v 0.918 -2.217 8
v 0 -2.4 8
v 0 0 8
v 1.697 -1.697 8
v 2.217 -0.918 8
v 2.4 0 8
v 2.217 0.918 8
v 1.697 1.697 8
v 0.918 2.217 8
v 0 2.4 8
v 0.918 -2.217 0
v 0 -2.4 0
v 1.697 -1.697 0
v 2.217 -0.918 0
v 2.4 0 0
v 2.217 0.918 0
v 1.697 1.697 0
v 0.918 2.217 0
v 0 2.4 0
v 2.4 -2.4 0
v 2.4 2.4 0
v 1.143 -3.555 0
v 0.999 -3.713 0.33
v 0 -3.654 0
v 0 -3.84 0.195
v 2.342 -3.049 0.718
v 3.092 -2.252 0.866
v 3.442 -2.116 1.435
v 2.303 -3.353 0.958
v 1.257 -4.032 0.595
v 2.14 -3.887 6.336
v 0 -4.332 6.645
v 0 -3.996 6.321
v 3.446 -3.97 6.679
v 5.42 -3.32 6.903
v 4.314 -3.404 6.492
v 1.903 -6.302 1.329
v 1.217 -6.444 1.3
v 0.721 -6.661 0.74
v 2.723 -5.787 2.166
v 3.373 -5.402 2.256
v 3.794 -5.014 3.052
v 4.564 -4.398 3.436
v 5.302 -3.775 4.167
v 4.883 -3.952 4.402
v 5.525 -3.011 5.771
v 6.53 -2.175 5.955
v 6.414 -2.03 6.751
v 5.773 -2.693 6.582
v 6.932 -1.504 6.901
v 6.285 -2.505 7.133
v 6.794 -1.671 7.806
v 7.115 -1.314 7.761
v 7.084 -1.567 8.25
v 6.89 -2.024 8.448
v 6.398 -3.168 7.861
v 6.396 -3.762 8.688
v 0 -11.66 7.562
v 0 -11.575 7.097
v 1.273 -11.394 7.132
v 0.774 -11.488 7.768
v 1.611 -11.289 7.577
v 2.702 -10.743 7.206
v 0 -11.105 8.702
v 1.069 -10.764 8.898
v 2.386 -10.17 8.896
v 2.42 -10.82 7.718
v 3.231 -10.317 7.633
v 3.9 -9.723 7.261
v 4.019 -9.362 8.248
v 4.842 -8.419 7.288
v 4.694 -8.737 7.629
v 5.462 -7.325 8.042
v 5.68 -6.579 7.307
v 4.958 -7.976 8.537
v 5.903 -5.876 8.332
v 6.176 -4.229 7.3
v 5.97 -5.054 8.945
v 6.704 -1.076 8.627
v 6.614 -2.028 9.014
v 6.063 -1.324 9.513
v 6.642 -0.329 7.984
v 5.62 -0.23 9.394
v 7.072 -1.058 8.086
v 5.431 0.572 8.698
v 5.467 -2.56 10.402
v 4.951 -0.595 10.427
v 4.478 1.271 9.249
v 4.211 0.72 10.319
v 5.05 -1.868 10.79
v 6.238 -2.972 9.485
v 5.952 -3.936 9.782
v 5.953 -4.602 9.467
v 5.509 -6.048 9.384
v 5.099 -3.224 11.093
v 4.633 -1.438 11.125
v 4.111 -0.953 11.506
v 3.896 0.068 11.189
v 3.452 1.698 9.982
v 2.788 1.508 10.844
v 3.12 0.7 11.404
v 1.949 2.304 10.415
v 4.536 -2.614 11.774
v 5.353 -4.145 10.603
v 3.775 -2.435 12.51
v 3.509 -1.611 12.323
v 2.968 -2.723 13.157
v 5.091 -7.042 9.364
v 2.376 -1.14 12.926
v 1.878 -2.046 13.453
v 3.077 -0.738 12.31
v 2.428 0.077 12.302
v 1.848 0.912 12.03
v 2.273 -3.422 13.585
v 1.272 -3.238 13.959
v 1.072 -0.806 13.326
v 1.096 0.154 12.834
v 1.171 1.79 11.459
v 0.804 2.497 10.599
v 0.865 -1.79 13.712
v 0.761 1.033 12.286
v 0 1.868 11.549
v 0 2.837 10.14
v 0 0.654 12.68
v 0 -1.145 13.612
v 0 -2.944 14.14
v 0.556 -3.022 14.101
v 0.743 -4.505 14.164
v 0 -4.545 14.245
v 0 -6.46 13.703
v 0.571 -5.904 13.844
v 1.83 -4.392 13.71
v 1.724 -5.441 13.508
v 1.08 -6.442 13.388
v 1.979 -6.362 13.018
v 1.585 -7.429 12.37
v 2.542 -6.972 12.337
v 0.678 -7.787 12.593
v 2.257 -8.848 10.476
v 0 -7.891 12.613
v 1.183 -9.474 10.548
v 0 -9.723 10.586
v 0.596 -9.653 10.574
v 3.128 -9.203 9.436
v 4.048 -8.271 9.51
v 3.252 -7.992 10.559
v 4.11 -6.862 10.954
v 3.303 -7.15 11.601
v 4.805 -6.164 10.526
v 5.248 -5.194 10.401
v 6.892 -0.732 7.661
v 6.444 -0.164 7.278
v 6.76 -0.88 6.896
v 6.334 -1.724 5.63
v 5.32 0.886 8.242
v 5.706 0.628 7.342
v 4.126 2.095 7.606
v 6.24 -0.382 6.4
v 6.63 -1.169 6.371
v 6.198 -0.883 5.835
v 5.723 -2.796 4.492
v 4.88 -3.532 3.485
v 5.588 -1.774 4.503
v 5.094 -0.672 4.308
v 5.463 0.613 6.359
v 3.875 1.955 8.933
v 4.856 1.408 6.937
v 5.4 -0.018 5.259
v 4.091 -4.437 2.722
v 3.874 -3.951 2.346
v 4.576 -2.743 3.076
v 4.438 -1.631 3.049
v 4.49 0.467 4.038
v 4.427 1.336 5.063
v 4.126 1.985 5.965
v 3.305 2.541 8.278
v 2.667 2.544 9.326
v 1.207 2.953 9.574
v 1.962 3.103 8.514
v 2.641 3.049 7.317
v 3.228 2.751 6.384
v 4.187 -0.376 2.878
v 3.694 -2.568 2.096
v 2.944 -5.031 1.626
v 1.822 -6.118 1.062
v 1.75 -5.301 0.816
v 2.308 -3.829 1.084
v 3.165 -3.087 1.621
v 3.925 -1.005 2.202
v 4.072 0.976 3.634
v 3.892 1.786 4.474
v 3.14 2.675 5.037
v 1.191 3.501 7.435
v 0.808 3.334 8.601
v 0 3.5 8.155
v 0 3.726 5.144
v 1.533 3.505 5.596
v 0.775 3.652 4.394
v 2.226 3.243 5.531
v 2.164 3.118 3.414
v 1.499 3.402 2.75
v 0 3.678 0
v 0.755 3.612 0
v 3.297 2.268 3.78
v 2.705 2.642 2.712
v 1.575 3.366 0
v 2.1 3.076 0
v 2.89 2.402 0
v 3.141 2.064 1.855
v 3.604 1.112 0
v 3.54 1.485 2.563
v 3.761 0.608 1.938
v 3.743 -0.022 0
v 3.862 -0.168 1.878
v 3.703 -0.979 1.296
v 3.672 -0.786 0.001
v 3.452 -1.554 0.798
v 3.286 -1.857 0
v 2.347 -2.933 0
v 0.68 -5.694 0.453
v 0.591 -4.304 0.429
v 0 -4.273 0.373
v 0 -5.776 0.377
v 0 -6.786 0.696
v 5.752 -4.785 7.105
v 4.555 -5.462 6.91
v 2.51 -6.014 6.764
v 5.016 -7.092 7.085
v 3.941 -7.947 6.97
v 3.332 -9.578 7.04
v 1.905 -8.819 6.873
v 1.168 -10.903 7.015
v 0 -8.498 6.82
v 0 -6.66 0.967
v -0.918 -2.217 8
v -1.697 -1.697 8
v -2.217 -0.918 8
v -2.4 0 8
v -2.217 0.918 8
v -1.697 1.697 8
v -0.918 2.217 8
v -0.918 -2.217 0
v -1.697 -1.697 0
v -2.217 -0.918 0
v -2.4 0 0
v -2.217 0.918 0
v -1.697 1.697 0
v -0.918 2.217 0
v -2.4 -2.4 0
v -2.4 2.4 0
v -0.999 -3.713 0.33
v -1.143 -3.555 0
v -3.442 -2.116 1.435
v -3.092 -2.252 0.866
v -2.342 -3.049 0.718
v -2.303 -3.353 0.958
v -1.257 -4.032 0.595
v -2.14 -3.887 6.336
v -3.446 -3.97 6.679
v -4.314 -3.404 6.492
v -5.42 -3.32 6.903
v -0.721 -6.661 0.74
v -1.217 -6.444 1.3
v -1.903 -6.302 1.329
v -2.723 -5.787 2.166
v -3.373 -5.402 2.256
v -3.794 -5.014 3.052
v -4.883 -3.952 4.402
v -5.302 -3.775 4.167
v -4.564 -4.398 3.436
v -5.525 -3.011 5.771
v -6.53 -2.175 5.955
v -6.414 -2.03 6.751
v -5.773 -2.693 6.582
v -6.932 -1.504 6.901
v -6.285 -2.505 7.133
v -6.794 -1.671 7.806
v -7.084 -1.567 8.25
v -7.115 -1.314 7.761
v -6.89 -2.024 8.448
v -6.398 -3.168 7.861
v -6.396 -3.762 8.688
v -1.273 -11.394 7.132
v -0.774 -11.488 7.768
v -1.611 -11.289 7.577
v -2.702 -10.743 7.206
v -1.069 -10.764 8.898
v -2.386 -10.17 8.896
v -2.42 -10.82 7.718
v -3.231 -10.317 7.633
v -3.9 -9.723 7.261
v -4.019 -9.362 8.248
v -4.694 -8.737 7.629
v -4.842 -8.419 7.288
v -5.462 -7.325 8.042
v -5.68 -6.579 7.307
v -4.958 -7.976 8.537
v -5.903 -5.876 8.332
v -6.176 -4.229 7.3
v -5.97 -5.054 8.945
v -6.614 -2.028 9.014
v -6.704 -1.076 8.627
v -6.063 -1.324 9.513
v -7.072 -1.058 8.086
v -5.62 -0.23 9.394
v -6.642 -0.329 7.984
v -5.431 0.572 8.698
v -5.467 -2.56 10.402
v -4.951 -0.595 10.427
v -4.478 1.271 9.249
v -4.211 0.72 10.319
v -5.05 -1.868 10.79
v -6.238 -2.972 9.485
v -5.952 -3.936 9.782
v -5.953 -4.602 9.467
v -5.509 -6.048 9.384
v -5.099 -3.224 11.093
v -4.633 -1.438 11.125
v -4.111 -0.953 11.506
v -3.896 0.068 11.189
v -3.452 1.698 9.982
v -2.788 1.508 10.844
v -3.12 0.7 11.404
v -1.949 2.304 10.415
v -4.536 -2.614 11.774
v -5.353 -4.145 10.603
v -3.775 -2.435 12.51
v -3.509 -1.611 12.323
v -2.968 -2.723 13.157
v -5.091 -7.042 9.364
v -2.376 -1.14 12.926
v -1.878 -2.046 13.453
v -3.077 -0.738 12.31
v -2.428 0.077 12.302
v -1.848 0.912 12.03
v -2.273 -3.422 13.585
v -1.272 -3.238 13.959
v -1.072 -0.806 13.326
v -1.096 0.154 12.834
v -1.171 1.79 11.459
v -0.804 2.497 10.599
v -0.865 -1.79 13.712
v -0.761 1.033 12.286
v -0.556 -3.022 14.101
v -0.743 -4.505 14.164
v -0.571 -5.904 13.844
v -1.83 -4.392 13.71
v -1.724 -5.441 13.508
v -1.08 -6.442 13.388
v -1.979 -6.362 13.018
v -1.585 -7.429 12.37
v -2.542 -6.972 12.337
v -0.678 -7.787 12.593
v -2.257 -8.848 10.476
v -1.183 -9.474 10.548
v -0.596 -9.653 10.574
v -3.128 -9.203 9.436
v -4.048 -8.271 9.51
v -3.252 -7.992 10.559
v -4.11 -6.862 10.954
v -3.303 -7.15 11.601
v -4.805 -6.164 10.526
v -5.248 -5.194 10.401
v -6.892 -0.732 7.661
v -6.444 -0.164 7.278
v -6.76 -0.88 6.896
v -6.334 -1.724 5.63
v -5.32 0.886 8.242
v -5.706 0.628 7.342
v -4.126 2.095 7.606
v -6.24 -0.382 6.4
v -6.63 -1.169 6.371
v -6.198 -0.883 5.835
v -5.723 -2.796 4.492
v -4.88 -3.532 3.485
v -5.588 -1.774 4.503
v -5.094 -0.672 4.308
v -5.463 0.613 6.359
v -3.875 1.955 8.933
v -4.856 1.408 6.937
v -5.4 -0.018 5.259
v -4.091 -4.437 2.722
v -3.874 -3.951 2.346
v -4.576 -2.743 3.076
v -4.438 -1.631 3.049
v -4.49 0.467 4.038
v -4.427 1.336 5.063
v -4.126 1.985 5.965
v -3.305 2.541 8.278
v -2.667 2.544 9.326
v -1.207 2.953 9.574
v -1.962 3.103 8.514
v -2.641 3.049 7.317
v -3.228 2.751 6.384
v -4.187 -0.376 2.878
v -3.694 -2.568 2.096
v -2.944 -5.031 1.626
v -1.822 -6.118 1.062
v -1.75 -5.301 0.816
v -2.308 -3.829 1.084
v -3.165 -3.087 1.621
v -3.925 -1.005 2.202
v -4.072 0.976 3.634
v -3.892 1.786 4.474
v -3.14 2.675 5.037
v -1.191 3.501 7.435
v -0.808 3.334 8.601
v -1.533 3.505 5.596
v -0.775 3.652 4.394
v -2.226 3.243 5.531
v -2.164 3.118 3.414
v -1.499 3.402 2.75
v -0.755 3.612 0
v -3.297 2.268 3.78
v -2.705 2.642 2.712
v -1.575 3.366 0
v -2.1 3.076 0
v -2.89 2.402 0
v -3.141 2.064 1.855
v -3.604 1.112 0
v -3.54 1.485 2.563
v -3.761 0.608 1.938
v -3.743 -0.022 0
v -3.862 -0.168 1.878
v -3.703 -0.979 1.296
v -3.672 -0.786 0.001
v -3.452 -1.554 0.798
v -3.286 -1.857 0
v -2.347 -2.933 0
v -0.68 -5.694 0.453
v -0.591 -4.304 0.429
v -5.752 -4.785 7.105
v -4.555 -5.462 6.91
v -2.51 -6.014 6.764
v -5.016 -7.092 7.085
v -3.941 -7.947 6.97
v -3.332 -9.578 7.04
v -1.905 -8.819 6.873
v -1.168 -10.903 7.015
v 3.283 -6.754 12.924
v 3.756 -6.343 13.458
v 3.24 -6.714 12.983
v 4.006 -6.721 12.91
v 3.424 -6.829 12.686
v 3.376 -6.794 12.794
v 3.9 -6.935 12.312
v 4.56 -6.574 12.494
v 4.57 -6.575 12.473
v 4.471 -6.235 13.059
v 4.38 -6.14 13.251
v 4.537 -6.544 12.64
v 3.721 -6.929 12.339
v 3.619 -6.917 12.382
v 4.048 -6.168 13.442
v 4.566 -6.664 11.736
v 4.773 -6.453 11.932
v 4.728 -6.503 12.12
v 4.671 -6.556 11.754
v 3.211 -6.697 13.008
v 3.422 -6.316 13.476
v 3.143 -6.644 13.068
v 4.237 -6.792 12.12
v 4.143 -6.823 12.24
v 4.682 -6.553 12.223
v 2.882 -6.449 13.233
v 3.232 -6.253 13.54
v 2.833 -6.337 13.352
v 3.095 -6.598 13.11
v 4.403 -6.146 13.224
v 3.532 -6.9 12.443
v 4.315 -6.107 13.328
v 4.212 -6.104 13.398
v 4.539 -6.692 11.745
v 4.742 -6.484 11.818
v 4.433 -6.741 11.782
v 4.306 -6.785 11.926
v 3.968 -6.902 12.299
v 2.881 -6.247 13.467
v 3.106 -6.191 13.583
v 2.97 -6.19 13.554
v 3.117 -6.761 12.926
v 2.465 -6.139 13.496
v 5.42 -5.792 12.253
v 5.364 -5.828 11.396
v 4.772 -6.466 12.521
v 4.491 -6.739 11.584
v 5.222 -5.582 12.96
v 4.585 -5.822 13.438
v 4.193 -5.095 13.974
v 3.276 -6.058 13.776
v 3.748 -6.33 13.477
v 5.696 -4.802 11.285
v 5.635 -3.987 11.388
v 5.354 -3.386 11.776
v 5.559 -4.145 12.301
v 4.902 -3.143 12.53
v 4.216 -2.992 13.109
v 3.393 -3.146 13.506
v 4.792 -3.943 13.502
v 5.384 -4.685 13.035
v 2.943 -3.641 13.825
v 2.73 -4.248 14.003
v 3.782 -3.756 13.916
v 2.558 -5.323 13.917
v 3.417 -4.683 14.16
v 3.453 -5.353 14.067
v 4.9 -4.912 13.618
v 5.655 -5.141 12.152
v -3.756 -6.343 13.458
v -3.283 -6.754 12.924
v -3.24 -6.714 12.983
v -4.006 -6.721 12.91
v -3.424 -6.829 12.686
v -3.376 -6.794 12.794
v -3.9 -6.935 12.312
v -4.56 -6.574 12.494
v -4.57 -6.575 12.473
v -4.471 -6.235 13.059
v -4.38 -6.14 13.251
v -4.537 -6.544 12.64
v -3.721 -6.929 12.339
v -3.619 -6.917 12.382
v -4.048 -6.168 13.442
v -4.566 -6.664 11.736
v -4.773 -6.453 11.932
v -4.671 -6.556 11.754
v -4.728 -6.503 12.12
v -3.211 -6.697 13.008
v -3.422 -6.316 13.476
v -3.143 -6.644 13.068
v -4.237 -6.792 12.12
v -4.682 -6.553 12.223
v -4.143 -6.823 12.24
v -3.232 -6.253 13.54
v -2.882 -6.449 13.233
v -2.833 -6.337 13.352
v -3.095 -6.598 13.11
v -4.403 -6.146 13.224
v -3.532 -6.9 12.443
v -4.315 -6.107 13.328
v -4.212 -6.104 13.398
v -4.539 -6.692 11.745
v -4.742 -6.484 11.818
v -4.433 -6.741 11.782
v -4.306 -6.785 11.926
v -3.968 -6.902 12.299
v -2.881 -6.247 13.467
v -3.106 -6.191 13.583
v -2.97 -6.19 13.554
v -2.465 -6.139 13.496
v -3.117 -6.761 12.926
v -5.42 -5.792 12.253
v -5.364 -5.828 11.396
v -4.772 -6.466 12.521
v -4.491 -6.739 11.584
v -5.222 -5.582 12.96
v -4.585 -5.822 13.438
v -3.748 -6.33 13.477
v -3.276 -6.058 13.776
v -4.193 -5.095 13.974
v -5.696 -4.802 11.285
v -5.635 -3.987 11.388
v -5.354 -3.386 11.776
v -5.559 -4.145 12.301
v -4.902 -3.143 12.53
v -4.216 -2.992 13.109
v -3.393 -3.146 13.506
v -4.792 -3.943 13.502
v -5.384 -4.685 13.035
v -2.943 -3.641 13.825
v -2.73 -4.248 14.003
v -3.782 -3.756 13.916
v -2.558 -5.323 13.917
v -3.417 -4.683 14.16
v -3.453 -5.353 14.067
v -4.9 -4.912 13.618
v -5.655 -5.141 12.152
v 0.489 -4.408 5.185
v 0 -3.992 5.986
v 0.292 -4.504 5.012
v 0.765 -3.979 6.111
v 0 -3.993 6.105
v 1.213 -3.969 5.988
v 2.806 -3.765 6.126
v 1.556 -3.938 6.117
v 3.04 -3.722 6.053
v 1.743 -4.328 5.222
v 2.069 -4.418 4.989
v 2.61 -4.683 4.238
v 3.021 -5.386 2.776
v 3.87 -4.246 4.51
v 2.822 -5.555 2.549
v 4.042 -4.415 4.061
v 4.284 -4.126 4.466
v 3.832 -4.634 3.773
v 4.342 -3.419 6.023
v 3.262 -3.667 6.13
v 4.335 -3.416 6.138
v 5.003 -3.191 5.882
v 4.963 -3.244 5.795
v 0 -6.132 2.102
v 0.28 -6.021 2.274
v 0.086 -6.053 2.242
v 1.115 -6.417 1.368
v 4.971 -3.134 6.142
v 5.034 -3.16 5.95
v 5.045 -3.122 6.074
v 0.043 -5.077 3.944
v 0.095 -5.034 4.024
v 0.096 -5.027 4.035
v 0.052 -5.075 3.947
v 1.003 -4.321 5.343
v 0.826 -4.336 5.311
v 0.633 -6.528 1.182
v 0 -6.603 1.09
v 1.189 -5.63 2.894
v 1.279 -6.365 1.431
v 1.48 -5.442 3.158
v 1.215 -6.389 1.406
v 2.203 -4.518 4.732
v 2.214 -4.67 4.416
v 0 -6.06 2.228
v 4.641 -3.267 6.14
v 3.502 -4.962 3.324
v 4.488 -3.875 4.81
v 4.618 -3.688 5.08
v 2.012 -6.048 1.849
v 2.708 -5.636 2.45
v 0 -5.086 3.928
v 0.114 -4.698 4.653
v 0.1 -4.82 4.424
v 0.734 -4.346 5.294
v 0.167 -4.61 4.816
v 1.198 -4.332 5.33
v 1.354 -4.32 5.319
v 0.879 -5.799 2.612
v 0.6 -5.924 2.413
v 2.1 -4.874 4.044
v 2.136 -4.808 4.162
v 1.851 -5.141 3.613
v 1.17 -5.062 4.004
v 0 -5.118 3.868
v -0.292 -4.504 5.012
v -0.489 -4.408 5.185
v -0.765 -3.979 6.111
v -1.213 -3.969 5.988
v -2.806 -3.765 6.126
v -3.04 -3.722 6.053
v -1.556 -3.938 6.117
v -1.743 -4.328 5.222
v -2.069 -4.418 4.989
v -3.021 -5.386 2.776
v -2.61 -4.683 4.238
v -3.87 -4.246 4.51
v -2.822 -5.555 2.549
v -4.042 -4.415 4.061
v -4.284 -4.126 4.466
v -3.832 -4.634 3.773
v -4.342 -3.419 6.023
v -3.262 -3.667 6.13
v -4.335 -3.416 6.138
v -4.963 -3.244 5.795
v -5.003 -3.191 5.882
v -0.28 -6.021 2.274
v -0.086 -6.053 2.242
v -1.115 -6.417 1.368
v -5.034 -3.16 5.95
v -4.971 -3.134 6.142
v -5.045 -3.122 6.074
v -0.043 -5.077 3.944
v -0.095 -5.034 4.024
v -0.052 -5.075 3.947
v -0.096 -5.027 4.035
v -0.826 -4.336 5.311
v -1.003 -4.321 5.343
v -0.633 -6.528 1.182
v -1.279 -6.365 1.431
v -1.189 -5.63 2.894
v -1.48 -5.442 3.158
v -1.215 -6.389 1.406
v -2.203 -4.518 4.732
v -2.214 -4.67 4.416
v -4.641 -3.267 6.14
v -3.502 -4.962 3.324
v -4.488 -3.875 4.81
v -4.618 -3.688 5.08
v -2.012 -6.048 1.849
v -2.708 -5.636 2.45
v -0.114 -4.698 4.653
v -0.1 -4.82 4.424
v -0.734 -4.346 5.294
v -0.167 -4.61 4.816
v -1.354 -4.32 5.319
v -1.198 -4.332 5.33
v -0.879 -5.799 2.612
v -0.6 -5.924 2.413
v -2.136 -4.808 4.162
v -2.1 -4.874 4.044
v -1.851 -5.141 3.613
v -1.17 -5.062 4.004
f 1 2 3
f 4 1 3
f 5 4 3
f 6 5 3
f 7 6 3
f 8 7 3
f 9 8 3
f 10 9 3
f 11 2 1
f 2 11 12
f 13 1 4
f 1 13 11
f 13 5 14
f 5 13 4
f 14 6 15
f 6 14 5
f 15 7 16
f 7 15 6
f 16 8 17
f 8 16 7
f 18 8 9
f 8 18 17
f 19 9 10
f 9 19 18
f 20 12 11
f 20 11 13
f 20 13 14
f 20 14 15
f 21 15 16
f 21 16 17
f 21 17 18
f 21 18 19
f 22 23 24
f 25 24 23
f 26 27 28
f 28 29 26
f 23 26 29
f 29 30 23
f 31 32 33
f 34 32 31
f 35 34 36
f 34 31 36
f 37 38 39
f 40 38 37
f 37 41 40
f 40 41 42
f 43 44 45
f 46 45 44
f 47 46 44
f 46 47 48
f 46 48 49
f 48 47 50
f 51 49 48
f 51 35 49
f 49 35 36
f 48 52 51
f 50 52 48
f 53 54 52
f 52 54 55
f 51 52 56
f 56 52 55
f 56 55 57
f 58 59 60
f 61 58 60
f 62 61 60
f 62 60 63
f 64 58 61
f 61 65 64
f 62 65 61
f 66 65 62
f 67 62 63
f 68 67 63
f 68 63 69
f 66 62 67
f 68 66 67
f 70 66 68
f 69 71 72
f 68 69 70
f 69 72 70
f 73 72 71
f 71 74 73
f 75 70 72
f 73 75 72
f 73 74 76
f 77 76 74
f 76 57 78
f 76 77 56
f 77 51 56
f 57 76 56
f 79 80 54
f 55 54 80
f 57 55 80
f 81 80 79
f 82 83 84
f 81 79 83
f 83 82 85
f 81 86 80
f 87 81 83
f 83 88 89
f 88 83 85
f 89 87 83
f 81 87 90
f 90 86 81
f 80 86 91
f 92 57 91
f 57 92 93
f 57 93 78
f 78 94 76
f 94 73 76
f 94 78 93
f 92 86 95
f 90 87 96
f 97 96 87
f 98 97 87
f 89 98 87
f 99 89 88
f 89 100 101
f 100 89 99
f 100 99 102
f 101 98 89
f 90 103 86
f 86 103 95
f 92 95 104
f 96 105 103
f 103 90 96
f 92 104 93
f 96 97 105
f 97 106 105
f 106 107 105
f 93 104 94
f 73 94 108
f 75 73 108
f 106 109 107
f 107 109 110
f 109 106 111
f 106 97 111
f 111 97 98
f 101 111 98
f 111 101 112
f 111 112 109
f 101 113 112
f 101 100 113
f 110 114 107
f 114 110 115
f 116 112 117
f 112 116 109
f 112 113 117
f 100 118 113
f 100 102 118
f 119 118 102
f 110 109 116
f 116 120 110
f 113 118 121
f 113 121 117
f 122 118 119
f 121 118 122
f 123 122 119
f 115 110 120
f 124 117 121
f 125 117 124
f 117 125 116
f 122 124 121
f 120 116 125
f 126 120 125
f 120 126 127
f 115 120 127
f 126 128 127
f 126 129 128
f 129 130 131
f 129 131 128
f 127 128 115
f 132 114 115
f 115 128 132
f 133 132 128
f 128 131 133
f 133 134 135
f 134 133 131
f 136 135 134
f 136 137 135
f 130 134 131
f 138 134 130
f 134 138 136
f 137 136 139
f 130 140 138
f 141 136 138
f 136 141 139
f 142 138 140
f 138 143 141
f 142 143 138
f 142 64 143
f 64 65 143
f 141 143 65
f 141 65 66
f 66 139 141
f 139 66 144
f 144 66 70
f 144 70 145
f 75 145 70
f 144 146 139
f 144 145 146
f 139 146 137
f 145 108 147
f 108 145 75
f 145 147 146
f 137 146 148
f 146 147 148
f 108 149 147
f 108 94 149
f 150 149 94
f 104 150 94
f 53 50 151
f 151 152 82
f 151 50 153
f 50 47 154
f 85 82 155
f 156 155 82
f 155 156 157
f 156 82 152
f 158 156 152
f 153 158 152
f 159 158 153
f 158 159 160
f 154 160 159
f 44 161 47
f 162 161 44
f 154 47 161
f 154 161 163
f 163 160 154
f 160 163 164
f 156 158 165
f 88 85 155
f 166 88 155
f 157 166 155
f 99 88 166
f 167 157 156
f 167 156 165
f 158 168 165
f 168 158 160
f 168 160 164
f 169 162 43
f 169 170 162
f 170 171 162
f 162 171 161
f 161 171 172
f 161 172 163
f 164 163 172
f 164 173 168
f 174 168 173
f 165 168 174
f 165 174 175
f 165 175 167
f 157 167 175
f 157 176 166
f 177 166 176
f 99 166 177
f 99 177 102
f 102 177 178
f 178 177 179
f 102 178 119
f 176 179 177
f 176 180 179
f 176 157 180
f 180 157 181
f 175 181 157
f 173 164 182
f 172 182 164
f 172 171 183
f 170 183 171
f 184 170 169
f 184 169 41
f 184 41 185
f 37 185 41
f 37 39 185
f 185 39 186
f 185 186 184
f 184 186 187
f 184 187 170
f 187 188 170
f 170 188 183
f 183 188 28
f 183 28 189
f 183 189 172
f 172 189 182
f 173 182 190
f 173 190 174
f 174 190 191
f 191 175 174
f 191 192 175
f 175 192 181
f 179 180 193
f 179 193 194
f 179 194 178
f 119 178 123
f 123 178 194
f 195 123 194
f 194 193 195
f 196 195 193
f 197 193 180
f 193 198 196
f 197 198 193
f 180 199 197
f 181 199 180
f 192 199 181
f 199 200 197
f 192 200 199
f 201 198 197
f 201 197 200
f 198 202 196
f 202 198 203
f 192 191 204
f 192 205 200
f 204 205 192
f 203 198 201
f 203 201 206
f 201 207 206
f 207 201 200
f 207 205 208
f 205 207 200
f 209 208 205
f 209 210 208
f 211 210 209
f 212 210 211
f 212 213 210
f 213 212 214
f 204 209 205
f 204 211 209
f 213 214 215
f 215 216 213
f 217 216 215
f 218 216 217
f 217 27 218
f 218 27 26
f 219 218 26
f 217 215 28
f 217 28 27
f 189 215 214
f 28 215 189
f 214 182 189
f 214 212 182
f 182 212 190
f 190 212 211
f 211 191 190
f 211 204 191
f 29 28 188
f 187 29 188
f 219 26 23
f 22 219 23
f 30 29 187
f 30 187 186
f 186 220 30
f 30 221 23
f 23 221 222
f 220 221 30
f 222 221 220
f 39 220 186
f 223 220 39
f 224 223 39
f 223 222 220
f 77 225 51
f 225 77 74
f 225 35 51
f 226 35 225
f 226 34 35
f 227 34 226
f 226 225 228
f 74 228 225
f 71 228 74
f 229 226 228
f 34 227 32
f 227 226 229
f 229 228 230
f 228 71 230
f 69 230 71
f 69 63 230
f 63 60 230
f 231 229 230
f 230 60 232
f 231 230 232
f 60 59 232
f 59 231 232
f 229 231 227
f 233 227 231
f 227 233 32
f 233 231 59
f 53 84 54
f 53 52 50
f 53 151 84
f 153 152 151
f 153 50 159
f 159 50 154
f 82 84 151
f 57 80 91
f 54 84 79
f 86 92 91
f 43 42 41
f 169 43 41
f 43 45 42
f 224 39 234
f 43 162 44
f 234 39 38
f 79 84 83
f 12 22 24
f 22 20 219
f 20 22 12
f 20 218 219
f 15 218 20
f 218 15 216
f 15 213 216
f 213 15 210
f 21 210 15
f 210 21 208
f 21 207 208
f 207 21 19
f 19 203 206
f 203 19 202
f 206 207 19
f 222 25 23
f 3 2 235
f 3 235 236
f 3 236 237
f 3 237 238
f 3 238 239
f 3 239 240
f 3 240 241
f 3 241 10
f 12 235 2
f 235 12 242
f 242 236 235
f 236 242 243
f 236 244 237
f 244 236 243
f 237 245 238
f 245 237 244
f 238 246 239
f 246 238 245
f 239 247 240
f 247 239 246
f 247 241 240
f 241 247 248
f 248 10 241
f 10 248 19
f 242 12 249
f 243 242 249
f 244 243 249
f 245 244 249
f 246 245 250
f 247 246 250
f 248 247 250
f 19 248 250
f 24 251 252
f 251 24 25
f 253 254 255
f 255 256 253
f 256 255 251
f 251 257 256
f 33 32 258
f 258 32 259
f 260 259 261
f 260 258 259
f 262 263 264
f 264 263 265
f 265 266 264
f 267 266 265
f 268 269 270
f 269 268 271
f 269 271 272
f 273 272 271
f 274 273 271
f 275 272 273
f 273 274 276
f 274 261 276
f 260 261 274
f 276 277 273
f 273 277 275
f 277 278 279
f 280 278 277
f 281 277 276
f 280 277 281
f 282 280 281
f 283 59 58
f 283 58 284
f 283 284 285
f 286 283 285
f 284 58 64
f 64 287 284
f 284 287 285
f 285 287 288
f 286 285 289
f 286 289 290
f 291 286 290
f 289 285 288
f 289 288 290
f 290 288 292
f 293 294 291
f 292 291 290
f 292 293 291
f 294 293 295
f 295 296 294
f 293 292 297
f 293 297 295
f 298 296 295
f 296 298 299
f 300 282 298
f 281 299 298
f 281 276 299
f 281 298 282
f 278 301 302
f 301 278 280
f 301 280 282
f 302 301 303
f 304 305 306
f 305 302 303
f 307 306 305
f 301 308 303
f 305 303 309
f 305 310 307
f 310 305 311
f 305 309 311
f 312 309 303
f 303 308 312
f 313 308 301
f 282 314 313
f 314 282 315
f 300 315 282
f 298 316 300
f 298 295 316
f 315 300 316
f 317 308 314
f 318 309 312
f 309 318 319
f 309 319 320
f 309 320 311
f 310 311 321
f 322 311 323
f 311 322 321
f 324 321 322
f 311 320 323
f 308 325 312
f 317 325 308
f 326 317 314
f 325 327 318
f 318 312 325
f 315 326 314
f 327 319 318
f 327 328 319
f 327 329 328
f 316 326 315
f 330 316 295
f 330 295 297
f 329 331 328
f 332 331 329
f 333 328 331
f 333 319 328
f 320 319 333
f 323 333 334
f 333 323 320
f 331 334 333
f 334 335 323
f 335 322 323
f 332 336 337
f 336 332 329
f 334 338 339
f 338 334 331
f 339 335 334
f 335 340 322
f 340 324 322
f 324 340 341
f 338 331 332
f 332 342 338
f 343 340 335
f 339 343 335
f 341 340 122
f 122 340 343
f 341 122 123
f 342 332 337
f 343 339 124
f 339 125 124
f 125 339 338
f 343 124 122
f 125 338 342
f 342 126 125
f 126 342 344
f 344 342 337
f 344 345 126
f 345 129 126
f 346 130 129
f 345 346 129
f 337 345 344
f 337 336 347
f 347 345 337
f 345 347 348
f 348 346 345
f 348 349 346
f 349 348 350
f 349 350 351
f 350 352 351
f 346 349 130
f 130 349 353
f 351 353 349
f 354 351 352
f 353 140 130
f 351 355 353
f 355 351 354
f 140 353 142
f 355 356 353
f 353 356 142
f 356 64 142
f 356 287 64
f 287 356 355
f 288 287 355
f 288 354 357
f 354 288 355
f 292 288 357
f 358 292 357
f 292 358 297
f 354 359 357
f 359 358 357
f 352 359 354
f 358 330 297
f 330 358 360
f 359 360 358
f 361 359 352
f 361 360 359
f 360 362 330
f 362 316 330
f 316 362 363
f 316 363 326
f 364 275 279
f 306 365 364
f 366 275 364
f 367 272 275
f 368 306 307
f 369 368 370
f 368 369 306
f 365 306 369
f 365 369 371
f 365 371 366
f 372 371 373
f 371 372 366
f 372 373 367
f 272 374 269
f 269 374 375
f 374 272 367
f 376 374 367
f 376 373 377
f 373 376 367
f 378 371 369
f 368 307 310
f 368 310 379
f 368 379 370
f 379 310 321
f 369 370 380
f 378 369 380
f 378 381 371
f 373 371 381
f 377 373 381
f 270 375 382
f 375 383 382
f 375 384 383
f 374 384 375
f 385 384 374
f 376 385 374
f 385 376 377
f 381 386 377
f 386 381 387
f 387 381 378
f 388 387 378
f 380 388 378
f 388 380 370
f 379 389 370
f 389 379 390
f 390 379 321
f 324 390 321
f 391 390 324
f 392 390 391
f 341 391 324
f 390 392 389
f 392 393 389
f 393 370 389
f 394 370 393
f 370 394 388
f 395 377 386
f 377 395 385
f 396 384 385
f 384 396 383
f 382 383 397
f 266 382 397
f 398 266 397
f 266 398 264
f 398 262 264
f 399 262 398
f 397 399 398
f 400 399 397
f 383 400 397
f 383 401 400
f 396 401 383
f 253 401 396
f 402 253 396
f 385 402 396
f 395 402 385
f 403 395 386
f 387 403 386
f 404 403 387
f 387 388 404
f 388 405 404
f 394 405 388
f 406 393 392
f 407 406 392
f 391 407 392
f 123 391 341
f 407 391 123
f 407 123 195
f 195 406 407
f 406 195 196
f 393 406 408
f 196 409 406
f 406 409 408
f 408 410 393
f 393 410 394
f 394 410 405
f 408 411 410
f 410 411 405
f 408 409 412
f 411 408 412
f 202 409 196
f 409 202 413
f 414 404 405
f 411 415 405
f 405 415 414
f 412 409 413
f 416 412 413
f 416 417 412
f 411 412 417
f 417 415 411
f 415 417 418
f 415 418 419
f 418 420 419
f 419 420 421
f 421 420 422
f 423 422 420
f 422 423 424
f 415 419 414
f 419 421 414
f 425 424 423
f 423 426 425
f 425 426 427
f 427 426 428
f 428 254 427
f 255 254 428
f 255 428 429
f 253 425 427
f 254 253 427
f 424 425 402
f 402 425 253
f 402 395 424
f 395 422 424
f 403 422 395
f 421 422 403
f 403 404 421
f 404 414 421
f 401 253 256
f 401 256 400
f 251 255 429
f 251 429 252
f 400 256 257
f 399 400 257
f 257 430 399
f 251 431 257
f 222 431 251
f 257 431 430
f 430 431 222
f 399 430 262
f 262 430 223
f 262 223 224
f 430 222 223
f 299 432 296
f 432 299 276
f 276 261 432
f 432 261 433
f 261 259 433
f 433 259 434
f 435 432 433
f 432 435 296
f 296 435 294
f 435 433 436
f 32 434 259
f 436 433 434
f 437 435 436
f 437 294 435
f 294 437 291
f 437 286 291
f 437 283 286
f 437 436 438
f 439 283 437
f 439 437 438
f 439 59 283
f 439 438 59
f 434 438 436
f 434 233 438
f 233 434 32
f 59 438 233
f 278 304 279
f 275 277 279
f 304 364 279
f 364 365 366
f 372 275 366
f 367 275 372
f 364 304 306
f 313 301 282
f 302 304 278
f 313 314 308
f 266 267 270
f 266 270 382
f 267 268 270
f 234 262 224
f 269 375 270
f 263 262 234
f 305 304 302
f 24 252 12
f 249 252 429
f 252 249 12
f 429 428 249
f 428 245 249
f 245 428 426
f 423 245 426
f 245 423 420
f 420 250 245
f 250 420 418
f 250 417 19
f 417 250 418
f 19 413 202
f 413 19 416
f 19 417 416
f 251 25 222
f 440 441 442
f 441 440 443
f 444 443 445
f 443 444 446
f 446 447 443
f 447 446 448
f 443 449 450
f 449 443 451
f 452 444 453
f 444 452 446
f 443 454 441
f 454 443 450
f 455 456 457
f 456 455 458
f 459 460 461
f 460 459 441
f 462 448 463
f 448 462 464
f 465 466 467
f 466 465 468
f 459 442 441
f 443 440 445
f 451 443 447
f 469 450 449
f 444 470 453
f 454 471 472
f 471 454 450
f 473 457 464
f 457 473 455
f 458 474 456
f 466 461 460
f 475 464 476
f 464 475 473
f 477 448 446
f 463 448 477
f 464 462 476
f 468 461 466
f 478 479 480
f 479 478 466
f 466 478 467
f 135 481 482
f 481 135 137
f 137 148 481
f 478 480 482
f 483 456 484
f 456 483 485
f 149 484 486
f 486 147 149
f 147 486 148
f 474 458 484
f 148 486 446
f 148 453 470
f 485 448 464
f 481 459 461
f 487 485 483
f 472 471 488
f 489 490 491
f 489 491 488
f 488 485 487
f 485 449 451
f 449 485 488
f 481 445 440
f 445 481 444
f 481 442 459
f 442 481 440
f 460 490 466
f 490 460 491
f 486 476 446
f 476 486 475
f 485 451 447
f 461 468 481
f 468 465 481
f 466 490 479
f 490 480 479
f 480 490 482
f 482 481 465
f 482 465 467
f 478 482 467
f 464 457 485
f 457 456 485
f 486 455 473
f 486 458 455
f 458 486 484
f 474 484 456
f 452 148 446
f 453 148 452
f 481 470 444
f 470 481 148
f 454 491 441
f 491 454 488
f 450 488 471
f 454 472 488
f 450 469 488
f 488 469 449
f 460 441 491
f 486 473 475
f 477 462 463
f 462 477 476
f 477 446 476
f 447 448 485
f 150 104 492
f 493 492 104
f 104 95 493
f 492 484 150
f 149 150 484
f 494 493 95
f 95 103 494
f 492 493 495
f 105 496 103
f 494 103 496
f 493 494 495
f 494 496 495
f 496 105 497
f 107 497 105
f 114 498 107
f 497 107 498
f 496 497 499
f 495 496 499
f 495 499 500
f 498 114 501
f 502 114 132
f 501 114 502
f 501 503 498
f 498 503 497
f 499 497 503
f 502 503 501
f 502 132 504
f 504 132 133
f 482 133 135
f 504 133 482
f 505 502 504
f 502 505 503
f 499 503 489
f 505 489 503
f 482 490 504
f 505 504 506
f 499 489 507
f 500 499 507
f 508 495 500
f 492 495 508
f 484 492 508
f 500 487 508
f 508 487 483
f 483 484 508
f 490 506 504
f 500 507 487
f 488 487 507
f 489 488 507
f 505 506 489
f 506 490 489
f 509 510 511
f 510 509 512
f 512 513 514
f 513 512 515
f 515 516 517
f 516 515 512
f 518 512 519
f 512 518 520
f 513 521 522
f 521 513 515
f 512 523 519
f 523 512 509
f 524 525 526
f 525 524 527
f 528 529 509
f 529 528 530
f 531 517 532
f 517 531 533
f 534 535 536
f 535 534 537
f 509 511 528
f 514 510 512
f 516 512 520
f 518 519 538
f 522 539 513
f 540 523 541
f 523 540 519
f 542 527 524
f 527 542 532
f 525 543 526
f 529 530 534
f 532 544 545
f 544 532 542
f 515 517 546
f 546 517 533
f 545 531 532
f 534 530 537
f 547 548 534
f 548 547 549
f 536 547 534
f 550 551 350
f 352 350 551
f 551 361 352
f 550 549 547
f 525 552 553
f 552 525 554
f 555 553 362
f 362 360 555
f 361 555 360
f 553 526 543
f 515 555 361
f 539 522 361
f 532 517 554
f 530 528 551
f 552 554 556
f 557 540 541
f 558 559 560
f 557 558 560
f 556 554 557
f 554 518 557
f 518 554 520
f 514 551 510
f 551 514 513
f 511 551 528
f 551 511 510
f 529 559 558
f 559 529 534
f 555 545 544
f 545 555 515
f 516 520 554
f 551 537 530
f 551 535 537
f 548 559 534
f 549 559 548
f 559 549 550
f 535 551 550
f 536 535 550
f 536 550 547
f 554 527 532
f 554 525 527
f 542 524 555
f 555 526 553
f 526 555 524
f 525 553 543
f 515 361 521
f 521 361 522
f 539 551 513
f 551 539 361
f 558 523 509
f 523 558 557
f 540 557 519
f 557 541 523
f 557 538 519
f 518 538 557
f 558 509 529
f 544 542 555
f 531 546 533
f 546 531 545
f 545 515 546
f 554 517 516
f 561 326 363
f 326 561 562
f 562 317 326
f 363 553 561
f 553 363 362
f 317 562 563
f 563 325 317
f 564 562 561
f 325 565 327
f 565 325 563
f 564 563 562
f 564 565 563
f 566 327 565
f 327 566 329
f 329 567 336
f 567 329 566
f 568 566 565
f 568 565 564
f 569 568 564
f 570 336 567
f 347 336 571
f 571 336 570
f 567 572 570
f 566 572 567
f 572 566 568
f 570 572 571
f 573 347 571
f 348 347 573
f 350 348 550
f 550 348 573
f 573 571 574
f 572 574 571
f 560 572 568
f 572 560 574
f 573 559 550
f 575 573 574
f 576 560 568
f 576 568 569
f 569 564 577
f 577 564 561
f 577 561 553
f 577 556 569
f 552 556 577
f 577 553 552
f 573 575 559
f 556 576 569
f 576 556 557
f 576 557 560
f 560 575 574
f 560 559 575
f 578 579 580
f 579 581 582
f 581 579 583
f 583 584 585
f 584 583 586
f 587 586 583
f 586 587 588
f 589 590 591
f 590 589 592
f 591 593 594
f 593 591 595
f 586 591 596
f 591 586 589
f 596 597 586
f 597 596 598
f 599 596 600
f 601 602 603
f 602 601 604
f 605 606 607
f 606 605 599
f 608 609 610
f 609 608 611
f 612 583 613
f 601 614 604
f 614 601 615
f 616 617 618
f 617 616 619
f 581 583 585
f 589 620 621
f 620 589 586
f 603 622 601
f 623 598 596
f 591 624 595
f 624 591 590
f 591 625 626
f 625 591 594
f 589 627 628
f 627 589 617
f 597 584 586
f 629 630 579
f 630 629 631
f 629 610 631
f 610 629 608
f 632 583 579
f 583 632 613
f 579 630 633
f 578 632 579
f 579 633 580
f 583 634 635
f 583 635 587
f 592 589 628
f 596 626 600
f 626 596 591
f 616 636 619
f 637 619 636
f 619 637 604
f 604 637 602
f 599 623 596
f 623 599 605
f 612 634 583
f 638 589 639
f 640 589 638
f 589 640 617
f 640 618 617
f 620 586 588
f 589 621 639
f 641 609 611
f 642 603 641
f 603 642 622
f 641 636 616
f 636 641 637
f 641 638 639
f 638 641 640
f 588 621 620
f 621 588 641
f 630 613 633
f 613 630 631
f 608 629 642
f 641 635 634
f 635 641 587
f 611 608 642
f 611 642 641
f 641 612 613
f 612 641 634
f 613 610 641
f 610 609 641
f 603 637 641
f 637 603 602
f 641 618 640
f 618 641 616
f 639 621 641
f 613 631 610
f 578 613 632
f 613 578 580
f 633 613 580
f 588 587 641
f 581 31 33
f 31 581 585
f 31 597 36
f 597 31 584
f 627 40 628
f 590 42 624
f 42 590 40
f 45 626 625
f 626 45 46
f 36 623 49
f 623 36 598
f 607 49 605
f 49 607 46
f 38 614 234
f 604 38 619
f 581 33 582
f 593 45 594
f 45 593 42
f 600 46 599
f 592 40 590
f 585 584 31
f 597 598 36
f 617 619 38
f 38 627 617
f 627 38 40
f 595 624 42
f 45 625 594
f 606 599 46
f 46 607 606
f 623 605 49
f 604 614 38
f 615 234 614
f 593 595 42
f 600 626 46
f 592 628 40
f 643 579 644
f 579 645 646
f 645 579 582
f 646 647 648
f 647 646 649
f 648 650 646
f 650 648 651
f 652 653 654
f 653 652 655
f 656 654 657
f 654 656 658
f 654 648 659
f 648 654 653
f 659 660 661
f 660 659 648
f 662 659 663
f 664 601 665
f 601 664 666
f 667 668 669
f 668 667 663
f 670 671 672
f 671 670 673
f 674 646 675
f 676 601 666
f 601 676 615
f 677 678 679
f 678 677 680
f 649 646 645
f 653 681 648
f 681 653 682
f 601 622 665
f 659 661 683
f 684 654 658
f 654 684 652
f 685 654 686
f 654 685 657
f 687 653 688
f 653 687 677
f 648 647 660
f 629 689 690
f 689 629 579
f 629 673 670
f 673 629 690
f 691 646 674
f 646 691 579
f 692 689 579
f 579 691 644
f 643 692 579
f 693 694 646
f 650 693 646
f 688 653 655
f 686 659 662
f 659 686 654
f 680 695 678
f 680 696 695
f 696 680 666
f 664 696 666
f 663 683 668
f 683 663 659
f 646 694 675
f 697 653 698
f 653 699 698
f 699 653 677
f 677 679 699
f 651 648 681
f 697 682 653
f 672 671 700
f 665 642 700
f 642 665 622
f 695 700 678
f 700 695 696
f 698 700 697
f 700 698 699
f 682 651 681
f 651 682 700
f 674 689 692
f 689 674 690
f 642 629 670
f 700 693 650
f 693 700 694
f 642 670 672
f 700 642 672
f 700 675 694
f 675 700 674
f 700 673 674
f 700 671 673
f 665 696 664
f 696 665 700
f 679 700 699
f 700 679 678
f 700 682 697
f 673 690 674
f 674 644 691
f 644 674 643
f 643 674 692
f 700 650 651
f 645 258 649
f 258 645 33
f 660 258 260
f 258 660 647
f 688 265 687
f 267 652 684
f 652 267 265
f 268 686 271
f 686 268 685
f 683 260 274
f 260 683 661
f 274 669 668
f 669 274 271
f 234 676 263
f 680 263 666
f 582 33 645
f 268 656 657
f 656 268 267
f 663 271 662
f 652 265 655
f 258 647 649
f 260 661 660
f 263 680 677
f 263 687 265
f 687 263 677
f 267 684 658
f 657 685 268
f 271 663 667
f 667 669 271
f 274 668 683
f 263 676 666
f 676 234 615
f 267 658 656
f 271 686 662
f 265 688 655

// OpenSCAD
use <../lib.scad>
use <s/89515p01s02.scad>
use <s/89515p01s03.scad>
use <s/89515s01.scad>
function ldraw_lib__89515p01() = [
// 0 Minifig Head Muppet Frog (Kermit) with White Eyes and Red Mouth Pattern
// 0 Name: 89515p01.dat
// 0 Author: Fredrik Hareide [fhareide]
// 0 !LDRAW_ORG Part UPDATE 2025-08
// 0 !LICENSE Licensed under CC BY 4.0 : see CAreadme.txt
// 
// 0 BFC CERTIFY CCW
  [0,"BFC","CERTIFY"],
  [0,"BFC","CCW"],
// 
// 0 !KEYWORDS Bricklink 89515pb01, CMF, Collectible Minifigures
// 0 !KEYWORDS Rebrickable 89515pr0001, set 71033, The Muppets
// 
// 0 !HISTORY 2025-08-31 [OrionP] Official Update 2025-08
// 
// 1 16 0 0 0 1 0 0 0 1 0 0 0 1 s\89515s01.dat
  [1,16,0,0,0,1,0,0,0,1,0,0,0,1, ldraw_lib__s__89515s01()],
// 1 16 0 0 0 -1 0 0 0 1 0 0 0 1 s\89515s01.dat
  [1,16,0,0,0,-1,0,0,0,1,0,0,0,1, ldraw_lib__s__89515s01()],
// 
// 1 15 0 0 0 1 0 0 0 1 0 0 0 1 s\89515p01s02.dat
  [1,15,0,0,0,1,0,0,0,1,0,0,0,1, ldraw_lib__s__89515p01s02()],
// 1 15 0 0 0 -1 0 0 0 1 0 0 0 1 s\89515p01s02.dat
  [1,15,0,0,0,-1,0,0,0,1,0,0,0,1, ldraw_lib__s__89515p01s02()],
// 
// 1 16 0 0 0 1 0 0 0 1 0 0 0 1 s\89515p01s03.dat
  [1,16,0,0,0,1,0,0,0,1,0,0,0,1, ldraw_lib__s__89515p01s03()],
// 1 16 0 0 0 -1 0 0 0 1 0 0 0 1 s\89515p01s03.dat
  [1,16,0,0,0,-1,0,0,0,1,0,0,0,1, ldraw_lib__s__89515p01s03()],
];
module ldraw_lib__89515p01(step=0, col=false, unit=2/5, alt=false, line=0.2, solid=!$preview)
    makepoly(ldraw_lib__89515p01(), step=step, col=col, unit=unit, alt=alt, line=line, solid=solid);
ldraw_lib__89515p01(line=0.2);
